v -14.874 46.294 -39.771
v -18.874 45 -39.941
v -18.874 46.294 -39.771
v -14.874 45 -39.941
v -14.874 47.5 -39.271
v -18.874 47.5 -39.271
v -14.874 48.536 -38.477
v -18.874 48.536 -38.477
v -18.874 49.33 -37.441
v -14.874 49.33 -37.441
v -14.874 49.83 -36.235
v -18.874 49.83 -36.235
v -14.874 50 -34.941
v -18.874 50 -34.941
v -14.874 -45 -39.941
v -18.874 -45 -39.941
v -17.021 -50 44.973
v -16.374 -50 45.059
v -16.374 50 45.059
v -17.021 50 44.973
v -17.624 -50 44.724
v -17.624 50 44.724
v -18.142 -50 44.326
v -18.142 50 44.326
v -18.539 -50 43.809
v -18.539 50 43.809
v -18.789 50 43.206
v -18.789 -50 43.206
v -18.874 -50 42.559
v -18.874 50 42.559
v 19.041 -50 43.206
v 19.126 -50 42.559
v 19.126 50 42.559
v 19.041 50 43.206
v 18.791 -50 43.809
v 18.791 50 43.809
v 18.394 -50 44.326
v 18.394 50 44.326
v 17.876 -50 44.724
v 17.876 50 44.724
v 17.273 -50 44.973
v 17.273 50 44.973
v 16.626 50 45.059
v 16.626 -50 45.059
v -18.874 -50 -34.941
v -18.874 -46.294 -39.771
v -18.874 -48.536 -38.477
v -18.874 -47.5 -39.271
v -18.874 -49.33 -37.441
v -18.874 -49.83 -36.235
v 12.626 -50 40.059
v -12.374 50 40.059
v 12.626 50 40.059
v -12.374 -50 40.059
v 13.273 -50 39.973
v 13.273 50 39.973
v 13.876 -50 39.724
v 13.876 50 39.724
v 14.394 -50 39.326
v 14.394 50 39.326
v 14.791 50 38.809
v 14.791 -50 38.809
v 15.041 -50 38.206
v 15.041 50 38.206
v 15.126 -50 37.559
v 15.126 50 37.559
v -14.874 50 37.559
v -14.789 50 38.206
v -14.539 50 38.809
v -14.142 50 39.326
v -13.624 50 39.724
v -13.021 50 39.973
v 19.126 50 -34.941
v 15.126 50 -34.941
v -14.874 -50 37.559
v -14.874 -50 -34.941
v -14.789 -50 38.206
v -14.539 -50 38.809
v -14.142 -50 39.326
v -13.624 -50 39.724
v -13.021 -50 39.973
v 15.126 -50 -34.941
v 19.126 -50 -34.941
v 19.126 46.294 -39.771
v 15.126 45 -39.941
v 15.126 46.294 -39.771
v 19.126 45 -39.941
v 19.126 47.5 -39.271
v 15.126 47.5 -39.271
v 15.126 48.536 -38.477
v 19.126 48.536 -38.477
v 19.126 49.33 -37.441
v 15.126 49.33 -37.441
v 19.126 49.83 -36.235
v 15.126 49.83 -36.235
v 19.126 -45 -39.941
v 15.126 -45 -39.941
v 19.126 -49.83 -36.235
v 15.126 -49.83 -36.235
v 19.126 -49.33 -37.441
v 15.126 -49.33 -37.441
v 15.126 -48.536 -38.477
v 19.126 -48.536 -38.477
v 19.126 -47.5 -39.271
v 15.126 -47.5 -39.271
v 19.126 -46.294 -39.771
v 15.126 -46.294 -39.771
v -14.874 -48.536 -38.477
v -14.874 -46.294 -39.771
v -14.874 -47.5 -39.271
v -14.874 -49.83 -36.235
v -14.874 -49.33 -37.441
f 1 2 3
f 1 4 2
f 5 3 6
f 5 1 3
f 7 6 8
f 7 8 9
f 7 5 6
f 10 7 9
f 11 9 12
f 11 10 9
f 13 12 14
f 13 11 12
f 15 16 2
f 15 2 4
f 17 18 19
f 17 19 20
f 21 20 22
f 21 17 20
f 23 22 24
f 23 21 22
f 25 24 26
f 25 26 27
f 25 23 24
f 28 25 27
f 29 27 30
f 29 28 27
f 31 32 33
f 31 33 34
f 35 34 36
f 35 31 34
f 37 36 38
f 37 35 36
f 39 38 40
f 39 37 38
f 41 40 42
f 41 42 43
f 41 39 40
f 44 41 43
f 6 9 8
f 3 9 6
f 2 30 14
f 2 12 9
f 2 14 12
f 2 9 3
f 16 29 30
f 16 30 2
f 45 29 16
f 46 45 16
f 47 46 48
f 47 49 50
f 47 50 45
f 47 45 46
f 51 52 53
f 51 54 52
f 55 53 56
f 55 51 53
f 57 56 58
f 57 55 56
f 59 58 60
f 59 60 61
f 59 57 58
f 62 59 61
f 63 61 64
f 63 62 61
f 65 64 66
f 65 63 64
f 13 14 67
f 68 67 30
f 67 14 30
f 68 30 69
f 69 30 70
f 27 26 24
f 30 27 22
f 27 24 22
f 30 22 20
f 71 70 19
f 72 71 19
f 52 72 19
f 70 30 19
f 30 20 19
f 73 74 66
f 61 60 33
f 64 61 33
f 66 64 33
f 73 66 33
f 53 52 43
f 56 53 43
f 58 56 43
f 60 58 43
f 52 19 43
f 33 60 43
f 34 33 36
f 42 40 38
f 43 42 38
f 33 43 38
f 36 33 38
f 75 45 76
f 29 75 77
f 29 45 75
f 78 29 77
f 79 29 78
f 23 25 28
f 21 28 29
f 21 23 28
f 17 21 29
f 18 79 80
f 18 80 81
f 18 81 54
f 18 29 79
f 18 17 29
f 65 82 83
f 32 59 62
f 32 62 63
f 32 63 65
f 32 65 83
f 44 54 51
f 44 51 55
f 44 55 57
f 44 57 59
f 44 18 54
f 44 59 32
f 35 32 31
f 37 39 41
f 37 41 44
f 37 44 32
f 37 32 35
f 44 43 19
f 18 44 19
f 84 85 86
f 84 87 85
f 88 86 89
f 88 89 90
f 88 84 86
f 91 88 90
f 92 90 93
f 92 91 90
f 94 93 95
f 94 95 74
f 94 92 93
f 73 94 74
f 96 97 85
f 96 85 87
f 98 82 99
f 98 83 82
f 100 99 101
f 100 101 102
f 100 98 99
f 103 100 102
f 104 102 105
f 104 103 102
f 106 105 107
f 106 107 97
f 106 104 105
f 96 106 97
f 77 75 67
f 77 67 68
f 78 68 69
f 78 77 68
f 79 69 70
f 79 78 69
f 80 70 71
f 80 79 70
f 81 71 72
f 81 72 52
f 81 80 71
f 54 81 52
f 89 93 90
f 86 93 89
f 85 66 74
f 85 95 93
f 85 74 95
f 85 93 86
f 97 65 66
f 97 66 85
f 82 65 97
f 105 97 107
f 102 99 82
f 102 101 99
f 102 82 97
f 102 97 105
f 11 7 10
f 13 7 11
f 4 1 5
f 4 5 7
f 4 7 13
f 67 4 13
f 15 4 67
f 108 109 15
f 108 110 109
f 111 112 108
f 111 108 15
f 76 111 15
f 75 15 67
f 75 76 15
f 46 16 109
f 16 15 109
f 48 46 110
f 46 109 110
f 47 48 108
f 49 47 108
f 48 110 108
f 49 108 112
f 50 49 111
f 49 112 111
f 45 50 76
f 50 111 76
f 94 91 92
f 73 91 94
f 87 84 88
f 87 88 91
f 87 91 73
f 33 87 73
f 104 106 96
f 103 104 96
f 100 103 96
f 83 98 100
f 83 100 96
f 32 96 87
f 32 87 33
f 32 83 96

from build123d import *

# Parameters (mm, degrees)
F1_DEPTH = 50
F2_R     = 5


with BuildPart() as f1:
    # F0 (on Front) → F1 (new body, symmetric)
    with BuildSketch(Plane.XZ):
        with BuildLine():
            Line((15.126235, 37.558659), (15.126235, -39.941341))
            Line((15.126235, -39.941341), (19.126235, -39.941341))
            Line((19.126235, -39.941341), (19.126235, 42.558659))
            ThreePointArc((19.126235, 42.558659), (18.394002, 44.326426), (16.626235, 45.058659))
            Line((16.626235, 45.058659), (0.126235, 45.058659))
            Line((0.126235, 45.058659), (-16.373765, 45.058659))
            ThreePointArc((-16.373765, 45.058659), (-18.141532, 44.326426), (-18.873765, 42.558659))
            Line((-18.873765, 42.558659), (-18.873765, -39.941341))
            Line((-18.873765, -39.941341), (-14.873765, -39.941341))
            Line((-14.873765, -39.941341), (-14.873765, 37.558659))
            ThreePointArc((-14.873765, 37.558659), (-14.141532, 39.326426), (-12.373765, 40.058659))
            Line((-12.373765, 40.058659), (12.626235, 40.058659))
            ThreePointArc((12.626235, 40.058659), (14.394002, 39.326426), (15.126235, 37.558659))
        make_face()
    extrude(amount=F1_DEPTH, both=True)

    # F2
    f2_edges = [f1.edges().sort_by_distance(p)[0] for p in [
        (17.126235, -50, -39.941341),
        (-16.873765, -50, -39.941341),
        (17.126235, 50, -39.941341),
        (-16.873765, 50, -39.941341),
    ]]
    fillet(f2_edges, radius=F2_R)


solid = f1.part
